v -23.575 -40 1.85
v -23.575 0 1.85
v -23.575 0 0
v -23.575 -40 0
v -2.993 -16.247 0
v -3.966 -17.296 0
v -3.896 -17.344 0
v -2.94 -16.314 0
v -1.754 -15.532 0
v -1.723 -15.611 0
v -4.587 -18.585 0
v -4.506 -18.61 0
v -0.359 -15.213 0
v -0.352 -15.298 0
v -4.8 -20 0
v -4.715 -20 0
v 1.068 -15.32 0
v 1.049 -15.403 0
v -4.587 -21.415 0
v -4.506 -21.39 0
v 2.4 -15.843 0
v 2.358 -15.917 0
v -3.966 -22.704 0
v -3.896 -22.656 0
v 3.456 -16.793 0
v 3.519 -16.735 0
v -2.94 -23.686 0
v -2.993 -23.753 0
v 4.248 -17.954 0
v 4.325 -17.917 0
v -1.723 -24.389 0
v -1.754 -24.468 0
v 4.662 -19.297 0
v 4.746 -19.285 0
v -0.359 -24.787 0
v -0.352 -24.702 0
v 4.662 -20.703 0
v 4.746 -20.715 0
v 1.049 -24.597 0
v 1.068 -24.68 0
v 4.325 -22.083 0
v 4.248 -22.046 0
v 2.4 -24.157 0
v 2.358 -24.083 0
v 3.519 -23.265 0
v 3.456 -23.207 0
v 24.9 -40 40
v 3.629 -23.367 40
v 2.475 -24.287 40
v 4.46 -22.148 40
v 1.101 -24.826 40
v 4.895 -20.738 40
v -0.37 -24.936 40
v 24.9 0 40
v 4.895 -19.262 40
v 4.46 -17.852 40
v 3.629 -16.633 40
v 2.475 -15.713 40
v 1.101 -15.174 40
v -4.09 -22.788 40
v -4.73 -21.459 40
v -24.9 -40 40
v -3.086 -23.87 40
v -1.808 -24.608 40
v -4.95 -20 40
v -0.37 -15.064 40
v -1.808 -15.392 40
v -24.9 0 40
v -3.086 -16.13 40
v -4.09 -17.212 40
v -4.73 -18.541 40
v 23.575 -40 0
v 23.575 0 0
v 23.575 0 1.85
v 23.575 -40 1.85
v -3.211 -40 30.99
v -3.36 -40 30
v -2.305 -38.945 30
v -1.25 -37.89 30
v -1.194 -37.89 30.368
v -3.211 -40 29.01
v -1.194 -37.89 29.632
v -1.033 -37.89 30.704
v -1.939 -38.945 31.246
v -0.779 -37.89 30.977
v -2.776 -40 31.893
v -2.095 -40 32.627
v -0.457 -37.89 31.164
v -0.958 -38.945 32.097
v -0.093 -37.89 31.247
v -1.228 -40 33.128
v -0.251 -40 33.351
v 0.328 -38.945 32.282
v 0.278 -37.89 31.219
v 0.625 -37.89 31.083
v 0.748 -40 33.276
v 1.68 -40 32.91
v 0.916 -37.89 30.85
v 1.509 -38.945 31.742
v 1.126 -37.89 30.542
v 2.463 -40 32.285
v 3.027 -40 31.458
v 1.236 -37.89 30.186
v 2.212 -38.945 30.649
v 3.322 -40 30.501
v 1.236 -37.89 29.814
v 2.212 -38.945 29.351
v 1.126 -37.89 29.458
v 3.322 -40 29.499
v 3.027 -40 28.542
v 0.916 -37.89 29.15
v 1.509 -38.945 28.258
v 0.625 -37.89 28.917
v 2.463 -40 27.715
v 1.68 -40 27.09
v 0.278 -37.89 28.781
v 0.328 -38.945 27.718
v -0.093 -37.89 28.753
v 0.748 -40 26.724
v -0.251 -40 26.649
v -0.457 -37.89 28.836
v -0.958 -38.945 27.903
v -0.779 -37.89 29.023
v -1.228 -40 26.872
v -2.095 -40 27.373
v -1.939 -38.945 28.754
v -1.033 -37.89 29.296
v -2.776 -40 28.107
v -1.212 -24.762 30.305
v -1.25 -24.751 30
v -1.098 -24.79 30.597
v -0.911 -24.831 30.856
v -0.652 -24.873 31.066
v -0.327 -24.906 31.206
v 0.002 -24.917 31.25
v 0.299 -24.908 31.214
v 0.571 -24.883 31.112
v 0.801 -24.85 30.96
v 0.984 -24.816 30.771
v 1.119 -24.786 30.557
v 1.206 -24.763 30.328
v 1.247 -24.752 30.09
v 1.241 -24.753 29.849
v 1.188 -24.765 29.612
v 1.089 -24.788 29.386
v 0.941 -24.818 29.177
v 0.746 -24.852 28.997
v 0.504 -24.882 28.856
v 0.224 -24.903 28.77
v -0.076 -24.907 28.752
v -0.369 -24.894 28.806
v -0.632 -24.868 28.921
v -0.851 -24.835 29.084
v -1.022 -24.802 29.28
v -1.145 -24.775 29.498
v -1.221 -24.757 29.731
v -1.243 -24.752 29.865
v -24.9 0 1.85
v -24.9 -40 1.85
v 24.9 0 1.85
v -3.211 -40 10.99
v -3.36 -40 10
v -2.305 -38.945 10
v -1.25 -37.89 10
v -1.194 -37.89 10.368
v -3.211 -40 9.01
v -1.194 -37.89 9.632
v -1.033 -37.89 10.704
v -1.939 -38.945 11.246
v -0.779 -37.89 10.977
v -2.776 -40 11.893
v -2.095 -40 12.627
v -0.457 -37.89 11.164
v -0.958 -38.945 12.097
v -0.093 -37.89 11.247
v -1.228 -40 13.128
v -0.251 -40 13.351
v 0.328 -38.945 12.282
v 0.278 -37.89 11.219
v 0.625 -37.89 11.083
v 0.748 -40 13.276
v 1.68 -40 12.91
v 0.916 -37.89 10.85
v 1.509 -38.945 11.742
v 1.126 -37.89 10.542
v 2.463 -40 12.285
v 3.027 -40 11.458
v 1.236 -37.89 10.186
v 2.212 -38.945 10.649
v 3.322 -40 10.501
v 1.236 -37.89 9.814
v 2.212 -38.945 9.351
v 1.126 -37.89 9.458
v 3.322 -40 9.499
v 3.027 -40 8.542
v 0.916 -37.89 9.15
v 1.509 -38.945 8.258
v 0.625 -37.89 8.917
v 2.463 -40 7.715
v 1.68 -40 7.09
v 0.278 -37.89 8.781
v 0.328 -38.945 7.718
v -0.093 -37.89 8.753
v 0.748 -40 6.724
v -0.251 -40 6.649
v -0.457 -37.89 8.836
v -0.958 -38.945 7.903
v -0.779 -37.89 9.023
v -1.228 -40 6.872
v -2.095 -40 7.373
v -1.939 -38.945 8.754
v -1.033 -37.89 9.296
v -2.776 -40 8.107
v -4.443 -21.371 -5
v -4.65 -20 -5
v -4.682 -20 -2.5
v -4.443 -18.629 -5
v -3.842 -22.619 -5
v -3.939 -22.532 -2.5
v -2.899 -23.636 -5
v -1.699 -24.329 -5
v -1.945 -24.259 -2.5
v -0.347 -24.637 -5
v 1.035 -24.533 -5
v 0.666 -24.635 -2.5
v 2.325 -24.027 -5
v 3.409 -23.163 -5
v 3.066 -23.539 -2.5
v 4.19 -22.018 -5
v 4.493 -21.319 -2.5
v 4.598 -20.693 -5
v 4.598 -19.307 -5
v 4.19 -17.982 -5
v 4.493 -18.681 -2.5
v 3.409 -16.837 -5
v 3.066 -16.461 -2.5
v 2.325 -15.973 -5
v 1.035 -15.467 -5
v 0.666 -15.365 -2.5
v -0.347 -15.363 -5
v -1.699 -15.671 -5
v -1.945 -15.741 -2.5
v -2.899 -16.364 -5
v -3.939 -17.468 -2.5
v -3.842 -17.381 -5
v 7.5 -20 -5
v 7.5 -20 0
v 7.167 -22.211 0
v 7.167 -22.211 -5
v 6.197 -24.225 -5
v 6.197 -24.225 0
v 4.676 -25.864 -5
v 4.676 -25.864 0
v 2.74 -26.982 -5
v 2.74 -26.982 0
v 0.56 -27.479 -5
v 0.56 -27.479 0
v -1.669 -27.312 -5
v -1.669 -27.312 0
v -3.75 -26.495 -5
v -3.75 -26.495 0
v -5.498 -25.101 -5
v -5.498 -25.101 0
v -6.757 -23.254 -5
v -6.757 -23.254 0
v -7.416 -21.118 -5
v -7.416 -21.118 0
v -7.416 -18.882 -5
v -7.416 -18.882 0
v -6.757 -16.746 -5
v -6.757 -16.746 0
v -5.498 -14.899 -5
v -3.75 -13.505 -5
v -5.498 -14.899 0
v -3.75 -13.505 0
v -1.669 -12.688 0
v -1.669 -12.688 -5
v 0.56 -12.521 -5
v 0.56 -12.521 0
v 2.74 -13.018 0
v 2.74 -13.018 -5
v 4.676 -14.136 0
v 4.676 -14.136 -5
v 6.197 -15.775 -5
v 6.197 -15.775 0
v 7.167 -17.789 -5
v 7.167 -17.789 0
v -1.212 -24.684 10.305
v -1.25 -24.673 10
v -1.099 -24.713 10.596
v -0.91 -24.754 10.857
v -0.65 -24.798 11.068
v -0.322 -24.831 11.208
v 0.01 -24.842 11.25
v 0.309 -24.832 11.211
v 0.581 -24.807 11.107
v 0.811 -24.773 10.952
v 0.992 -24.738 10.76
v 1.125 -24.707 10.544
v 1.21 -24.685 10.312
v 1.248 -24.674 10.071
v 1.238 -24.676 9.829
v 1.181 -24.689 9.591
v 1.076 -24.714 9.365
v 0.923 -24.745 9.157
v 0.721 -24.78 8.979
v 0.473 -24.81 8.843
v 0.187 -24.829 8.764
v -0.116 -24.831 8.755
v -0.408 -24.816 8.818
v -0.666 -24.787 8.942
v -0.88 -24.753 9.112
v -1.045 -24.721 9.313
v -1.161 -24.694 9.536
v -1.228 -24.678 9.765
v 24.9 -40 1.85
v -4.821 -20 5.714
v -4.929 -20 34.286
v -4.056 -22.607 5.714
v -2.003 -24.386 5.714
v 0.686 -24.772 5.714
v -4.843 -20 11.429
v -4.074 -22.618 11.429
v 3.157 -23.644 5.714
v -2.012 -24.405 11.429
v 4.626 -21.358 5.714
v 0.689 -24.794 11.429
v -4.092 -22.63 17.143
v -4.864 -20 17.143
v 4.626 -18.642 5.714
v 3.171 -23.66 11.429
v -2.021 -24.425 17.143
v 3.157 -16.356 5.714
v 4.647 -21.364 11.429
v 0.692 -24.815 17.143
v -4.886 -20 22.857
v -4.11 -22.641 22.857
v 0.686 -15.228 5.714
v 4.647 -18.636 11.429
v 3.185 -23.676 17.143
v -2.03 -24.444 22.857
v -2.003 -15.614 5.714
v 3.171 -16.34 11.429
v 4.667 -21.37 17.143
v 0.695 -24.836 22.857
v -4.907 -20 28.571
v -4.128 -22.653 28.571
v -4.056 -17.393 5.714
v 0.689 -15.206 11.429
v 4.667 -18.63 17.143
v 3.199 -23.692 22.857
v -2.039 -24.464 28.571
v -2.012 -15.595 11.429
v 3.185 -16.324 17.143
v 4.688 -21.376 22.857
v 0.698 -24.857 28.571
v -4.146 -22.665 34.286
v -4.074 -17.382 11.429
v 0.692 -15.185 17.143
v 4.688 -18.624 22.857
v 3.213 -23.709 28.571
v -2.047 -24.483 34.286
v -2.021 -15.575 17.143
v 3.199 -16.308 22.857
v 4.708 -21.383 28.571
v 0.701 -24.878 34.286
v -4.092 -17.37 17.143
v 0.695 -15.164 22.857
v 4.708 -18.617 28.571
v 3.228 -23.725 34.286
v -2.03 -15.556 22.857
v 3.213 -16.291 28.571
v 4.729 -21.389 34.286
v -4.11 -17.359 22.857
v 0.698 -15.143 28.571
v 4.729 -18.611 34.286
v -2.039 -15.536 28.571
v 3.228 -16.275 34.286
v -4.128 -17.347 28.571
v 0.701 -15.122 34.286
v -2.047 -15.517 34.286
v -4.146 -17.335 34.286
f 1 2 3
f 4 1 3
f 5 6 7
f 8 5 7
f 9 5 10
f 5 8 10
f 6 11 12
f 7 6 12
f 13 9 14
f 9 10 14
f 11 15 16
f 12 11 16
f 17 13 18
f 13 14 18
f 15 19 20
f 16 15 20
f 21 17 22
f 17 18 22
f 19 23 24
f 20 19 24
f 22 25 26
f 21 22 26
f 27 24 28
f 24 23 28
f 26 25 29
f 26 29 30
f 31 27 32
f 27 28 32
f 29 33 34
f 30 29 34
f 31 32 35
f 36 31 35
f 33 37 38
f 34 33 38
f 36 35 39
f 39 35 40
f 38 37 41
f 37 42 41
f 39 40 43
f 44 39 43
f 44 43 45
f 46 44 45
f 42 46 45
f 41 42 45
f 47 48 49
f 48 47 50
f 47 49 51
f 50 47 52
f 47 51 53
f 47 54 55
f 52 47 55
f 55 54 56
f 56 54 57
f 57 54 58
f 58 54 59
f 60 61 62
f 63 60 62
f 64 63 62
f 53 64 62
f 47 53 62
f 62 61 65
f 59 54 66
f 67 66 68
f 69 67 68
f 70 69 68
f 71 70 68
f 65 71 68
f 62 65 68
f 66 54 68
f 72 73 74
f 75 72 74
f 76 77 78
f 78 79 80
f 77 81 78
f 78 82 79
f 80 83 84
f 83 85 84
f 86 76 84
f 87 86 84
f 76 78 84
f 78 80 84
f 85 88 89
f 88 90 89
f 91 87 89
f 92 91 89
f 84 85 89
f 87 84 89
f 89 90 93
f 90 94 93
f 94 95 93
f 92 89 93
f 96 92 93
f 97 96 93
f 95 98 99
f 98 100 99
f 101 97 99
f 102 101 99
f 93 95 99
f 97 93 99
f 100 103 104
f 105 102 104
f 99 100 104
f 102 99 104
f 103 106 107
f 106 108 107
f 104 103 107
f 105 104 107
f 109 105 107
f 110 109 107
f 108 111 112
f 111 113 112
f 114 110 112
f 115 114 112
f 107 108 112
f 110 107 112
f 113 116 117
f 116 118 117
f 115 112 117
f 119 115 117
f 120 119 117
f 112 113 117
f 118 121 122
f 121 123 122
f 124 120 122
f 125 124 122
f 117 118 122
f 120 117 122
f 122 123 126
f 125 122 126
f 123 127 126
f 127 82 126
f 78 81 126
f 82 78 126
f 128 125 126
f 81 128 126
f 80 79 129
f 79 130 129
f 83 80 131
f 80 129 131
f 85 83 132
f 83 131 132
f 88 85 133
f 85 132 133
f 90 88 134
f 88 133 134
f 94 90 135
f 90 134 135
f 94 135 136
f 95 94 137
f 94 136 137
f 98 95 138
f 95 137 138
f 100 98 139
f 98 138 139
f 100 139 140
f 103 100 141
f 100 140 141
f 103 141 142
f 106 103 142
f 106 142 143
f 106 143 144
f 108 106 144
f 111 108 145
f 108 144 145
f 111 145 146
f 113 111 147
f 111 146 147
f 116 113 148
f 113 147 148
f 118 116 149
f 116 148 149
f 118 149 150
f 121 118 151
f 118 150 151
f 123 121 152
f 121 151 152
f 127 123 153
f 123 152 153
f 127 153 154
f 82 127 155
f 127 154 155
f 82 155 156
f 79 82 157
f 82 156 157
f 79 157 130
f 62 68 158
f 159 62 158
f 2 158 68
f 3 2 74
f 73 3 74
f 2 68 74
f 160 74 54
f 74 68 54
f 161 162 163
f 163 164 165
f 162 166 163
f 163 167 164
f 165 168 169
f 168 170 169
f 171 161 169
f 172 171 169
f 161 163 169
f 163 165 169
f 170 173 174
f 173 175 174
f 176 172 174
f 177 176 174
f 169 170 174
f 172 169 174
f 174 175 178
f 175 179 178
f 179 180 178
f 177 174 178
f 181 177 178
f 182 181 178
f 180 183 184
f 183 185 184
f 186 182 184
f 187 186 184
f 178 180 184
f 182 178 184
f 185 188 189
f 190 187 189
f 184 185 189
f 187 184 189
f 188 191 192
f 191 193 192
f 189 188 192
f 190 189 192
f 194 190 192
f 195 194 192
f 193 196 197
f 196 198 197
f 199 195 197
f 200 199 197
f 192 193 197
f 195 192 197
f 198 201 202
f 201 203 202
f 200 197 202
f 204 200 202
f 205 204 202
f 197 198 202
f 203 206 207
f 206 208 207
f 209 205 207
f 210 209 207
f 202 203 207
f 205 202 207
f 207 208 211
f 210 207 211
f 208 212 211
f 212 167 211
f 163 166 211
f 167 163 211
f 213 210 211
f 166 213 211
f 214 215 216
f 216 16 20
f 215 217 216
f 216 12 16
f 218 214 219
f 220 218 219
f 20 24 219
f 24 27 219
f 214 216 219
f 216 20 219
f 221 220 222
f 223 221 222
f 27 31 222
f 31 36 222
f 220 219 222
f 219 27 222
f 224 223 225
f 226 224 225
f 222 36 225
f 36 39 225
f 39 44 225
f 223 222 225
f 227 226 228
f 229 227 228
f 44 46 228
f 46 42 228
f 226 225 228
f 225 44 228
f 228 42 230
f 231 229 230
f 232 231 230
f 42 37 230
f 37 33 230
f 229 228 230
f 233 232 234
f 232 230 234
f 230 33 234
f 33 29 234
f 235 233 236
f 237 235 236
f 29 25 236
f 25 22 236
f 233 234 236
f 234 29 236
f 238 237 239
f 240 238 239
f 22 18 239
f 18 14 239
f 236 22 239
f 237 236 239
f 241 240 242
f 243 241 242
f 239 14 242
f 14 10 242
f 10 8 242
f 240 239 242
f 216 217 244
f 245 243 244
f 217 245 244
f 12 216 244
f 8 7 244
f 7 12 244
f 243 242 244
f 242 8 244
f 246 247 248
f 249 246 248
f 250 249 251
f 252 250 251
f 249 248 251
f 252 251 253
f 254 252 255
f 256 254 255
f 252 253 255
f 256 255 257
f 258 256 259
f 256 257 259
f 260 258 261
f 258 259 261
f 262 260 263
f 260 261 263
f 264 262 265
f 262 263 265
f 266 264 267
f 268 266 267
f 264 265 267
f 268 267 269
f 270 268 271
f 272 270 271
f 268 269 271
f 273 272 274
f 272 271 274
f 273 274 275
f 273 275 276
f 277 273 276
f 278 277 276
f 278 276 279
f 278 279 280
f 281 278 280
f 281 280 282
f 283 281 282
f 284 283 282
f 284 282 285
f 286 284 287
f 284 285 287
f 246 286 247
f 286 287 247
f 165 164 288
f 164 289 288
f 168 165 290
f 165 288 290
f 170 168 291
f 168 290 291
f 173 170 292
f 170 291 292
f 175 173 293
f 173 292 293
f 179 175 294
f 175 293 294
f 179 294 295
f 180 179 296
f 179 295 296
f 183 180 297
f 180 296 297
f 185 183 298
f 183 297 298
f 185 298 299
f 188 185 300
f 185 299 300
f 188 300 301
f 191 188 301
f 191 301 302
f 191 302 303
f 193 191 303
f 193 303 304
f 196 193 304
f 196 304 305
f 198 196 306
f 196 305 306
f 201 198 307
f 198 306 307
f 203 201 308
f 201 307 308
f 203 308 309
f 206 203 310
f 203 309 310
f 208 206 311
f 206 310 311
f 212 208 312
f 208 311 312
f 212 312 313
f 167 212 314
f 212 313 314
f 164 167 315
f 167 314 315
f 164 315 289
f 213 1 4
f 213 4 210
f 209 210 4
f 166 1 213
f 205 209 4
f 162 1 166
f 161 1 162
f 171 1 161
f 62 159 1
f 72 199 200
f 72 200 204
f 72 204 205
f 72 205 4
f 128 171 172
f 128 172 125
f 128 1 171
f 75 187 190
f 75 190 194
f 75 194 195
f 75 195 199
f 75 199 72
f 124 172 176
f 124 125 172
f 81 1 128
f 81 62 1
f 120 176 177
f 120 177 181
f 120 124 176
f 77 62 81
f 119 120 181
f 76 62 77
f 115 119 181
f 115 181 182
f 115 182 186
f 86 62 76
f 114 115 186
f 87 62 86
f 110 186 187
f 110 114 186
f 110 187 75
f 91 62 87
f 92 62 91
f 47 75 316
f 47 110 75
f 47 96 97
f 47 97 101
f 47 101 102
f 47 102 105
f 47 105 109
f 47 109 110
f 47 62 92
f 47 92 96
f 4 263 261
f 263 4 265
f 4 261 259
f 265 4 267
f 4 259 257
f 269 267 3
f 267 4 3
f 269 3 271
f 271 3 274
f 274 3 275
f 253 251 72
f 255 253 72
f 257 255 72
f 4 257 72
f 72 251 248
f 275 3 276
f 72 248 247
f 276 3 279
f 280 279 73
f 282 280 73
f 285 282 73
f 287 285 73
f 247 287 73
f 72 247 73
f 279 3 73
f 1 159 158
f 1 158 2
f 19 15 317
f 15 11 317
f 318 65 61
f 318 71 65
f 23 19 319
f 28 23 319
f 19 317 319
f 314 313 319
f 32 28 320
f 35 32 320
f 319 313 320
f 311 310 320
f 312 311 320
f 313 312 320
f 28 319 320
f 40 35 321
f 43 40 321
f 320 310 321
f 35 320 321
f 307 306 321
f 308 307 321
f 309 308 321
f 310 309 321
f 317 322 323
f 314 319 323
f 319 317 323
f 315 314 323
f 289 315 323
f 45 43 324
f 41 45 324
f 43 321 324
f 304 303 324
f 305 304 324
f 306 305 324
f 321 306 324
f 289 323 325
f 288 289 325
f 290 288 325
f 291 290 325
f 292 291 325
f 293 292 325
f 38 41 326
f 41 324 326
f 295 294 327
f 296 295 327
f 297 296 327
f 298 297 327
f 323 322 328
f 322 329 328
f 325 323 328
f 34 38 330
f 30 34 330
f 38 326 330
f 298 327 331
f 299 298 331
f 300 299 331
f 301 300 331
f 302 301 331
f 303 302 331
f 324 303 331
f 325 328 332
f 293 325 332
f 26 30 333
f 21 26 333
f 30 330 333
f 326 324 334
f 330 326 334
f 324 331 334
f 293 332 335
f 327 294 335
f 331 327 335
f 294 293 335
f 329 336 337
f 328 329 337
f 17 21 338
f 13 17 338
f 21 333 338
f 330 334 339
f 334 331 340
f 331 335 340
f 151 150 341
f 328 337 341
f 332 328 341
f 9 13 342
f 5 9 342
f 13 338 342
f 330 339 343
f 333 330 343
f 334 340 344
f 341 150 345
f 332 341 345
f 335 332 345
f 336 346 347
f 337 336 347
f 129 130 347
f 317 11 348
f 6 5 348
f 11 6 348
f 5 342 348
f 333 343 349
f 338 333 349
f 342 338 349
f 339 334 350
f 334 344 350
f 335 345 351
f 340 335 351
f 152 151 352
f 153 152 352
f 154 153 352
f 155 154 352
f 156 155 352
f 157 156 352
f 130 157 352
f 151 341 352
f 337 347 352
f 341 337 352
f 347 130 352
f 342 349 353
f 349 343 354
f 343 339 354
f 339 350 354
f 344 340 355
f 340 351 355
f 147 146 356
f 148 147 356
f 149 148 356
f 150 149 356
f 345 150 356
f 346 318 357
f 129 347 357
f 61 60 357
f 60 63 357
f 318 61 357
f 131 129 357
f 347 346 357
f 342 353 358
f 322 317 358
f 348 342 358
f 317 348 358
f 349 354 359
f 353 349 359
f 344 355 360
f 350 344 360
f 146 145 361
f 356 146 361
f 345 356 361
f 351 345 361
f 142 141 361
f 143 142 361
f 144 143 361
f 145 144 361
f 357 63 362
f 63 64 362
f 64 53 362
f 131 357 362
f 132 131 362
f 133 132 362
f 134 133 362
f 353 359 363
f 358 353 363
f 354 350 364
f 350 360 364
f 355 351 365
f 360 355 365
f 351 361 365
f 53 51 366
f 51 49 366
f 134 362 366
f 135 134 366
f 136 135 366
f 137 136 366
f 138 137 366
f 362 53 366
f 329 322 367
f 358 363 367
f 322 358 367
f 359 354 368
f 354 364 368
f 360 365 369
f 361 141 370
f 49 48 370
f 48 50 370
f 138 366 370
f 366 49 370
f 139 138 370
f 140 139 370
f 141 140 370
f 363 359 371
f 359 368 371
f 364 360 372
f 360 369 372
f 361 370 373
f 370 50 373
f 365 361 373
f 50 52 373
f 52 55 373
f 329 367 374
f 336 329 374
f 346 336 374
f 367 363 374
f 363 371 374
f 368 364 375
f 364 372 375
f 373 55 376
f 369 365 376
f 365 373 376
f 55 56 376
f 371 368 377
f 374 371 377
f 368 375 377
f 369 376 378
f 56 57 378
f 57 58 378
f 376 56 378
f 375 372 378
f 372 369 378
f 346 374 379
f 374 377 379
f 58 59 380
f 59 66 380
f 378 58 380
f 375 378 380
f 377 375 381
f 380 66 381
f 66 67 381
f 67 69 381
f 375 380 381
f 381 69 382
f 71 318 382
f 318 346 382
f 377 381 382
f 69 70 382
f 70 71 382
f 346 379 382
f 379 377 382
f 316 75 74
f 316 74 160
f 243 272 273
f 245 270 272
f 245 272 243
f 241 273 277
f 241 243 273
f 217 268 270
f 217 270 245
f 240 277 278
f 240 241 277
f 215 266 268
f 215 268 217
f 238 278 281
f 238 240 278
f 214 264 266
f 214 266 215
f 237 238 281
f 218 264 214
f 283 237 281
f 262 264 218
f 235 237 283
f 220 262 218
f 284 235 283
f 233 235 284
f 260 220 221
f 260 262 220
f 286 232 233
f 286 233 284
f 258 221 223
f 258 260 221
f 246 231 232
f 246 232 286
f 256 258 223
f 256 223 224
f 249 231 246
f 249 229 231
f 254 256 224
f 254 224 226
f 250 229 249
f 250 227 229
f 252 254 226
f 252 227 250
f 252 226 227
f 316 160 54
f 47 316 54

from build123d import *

# Parameters (mm, degrees)
F1_DEPTH        = 40
F2_R            = 7.5
F3_DEPTH        = 5
F10_D           = 2.5
F10_DEPTH       = 16
F10_CSINK_D     = 6.72
F10_CSINK_ANGLE = 90
F10_TIP         = 0.7510757738


with BuildPart() as f1:
    # F0 (on Front) → F1 (new body)
    with BuildSketch(Plane.XZ):
        Polygon((24.9, 40), (-24.9, 40), (-24.9, 1.85), (-23.575, 1.85), (-23.575, 0), (23.575, 0), (23.575, 1.85), (24.9, 1.85), align=None)
    extrude(amount=F1_DEPTH)

    # F2 (on face) → F3 (join)
    with BuildSketch(Plane(origin=(0, 0, 0), x_dir=(1, 0, 0), z_dir=(0, 0, -1))):
        with Locations((0, 20)):
            Circle(F2_R)
    extrude(amount=F3_DEPTH)


with BuildPart() as f7:
    # F6 (on line) → F7 (revolve)
    with BuildSketch(Plane(origin=(0, -20, 0), x_dir=(-1, 0, 0), z_dir=(0, 1, 0))):
        Polygon((4.8, 0), (4.95, 40), (0, 40), (0, 0), (0, -5), (4.65, -5), (4.715, 0), align=None)
    revolve(axis=Axis((0, -20, 30.4776426257), (0, 0, 1)))


with BuildPart() as f1_1:
    add(f1.part)

    # F8: cut F7
    add(f7.part, mode=Mode.SUBTRACT)

    # F10
    with Locations(Plane.XZ.offset(40)):
        with Locations((0, 30), (0, 10)):
            CounterSinkHole(F10_D / 2, F10_CSINK_D / 2, depth=F10_DEPTH, counter_sink_angle=F10_CSINK_ANGLE)
            with Locations((0, 0, -(F10_DEPTH + F10_TIP / 2))):  # 118° drill point
                Cone(0, F10_D / 2, F10_TIP, mode=Mode.SUBTRACT)


solid = f1_1.part
